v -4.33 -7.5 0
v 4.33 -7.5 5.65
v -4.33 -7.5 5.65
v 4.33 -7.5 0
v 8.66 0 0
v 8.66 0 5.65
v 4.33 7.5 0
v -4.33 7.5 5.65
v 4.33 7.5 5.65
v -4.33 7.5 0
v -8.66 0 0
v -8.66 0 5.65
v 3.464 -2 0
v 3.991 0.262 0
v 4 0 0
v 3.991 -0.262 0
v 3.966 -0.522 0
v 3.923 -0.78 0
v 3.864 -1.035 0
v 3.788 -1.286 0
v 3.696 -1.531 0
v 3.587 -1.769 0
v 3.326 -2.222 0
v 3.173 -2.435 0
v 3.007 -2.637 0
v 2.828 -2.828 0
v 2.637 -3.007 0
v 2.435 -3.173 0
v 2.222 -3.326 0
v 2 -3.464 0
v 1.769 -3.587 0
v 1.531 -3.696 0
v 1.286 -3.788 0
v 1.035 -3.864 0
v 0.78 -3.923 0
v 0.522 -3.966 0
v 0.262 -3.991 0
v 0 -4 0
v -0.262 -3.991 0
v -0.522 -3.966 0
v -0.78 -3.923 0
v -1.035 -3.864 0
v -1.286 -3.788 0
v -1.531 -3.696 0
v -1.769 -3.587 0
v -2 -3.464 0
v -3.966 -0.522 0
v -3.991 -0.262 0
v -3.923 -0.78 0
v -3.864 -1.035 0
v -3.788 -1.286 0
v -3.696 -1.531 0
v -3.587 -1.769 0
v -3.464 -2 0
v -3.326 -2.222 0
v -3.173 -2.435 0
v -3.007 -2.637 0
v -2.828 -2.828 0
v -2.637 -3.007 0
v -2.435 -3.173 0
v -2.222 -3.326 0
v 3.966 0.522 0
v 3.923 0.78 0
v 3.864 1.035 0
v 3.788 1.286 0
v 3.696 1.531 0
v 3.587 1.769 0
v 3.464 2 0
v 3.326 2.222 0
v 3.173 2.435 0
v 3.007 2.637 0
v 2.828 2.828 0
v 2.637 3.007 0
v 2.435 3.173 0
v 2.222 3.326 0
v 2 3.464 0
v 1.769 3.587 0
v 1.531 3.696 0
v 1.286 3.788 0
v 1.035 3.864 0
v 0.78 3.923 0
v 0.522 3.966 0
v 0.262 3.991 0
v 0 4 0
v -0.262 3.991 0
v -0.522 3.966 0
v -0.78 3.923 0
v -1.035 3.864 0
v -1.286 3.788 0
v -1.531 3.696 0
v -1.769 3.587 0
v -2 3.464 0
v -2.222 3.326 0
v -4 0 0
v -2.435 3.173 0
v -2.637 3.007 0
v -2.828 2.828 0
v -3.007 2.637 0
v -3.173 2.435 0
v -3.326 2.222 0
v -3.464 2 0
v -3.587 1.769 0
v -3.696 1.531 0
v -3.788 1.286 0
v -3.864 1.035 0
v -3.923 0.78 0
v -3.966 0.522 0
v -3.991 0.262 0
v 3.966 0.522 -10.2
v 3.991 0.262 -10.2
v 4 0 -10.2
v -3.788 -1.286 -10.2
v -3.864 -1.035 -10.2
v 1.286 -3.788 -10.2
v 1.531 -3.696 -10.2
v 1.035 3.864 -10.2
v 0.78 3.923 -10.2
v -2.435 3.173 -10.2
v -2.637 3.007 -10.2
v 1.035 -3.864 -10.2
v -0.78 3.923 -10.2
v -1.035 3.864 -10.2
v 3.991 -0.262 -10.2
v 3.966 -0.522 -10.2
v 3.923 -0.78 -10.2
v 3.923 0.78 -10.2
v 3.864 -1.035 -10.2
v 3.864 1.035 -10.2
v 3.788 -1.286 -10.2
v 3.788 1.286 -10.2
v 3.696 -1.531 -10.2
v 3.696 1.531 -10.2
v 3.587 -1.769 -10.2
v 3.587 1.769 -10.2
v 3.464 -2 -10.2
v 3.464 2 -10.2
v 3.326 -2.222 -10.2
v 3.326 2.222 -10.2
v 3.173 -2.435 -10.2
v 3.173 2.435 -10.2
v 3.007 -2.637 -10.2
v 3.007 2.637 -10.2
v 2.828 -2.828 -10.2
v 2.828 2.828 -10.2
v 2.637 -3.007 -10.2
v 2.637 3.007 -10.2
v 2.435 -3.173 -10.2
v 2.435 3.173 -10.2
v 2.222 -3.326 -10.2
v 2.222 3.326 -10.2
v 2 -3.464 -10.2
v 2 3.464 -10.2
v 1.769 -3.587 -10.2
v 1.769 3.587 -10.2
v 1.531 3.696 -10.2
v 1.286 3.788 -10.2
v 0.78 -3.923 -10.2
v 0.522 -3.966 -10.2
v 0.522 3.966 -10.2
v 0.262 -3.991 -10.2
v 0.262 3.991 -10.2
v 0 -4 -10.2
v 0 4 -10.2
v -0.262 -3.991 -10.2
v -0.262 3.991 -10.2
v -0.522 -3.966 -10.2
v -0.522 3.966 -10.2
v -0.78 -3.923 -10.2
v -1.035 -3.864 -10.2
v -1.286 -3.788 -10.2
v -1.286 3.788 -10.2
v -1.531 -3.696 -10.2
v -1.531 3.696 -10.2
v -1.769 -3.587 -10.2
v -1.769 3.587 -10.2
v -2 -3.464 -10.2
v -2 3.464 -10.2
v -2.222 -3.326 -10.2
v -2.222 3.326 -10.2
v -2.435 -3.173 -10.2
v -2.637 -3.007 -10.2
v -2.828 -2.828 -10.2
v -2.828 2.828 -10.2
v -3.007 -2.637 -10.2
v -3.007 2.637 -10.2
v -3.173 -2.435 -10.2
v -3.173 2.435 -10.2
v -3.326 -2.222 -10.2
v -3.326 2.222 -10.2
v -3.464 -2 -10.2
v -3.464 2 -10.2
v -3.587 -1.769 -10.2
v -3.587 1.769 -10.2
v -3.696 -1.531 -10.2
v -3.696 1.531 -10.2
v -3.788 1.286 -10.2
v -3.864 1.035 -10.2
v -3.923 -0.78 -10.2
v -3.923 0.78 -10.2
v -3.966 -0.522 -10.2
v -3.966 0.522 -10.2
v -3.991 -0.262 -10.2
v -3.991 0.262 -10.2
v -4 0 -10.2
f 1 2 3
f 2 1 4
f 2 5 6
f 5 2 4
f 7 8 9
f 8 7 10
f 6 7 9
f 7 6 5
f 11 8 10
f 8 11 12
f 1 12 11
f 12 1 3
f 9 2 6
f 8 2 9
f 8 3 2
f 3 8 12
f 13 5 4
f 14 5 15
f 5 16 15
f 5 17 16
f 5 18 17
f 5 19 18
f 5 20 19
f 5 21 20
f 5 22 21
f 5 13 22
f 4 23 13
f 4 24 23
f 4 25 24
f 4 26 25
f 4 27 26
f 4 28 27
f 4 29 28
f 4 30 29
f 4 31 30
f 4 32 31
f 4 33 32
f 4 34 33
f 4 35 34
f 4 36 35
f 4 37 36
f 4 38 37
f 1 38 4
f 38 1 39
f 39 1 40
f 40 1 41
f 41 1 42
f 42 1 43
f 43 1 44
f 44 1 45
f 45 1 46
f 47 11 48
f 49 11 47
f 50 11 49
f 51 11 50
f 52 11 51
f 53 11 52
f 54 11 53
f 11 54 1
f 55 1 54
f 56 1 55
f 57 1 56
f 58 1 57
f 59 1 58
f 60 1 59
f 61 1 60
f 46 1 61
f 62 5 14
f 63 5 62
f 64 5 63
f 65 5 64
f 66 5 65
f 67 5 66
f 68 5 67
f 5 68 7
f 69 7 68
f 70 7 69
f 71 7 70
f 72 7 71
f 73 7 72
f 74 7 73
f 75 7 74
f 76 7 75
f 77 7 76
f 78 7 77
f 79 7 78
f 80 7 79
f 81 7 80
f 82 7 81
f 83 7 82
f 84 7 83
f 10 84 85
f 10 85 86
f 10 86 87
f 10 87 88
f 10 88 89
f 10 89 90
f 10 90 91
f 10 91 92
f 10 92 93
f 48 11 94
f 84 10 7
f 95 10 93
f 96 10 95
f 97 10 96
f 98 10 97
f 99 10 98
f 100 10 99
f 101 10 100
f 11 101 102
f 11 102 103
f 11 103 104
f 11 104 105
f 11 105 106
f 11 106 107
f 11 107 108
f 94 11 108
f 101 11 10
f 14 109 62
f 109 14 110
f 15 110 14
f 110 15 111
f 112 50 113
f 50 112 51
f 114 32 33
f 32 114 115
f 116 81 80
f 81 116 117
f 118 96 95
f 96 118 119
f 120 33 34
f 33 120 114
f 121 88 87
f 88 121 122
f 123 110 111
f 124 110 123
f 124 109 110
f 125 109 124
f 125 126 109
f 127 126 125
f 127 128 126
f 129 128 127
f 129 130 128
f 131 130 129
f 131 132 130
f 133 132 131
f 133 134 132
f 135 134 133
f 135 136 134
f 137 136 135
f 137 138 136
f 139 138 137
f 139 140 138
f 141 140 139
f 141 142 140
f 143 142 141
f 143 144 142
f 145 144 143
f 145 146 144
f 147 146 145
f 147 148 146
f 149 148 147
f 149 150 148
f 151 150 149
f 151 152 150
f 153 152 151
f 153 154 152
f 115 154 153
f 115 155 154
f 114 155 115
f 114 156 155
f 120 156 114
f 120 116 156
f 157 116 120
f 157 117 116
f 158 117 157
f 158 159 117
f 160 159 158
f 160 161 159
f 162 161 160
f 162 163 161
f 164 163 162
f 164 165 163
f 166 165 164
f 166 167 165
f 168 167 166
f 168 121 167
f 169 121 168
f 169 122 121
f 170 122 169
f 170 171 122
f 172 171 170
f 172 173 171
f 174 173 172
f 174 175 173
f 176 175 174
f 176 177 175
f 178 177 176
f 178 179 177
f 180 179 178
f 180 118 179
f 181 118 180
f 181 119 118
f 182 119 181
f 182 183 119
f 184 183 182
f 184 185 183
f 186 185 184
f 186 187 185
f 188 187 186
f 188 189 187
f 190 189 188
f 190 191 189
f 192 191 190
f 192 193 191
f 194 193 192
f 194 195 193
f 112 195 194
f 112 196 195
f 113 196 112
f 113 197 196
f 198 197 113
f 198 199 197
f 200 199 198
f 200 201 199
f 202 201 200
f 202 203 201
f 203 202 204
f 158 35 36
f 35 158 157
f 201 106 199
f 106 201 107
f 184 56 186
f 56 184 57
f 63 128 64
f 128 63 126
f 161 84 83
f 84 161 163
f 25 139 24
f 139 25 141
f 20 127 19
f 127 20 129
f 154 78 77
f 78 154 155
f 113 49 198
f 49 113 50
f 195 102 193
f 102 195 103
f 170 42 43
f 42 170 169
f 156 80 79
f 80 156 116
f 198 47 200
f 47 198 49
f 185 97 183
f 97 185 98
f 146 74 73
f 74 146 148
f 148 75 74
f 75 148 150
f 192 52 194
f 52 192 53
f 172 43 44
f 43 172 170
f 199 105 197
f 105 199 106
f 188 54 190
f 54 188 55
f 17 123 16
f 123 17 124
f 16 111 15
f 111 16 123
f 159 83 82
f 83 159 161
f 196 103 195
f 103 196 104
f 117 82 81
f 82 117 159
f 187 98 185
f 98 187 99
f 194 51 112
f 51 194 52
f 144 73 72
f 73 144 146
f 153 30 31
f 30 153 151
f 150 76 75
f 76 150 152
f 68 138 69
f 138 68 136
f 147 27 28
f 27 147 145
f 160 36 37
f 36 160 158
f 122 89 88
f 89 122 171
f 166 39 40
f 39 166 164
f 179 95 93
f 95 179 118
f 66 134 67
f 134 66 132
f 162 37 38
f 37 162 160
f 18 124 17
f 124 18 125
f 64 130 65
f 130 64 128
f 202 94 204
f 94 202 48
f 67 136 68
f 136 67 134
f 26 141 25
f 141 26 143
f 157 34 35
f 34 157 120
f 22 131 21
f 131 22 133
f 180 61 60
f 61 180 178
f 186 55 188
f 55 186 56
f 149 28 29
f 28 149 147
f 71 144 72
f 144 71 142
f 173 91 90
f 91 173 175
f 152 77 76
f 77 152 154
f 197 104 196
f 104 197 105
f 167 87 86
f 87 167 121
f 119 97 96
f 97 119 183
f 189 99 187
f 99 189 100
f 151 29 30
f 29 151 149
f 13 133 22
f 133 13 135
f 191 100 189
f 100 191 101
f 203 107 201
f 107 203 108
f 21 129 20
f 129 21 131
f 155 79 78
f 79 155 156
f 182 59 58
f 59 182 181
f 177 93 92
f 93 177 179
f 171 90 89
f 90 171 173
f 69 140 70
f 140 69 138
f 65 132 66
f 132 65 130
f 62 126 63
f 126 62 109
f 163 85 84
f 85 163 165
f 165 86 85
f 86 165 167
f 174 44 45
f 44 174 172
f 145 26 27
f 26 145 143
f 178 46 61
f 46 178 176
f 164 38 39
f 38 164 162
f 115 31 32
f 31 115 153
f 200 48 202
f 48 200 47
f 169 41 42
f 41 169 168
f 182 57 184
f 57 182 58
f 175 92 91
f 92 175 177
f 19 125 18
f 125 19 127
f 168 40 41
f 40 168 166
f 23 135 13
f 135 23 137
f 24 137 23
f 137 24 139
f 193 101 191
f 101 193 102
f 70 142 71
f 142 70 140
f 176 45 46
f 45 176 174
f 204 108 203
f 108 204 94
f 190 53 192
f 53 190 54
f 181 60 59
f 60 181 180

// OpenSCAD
// Hex head screw (single connected solid)
// Specs: 8.0mm shank diameter, 15.0mm head diameter (across flats), head height 5.65mm, 10.0mm length under head

shaft_diameter_mm      = 8.0;
head_across_flats_mm   = 15.0;
head_height_mm         = 5.65;
length_under_head_mm   = 10.0;

// Small overlap to guarantee watertight union
overlap_mm = 0.2;

// Derived: hex circumradius from across-flats (AF = 2*R*cos(30) => R = AF / sqrt(3))
hex_circumradius_mm = head_across_flats_mm / sqrt(3);

module hex_head_screw() {
    union() {
        // Head: sits on top of the under-head plane at z=0
        translate([0, 0, head_height_mm/2])
            cylinder(r=hex_circumradius_mm, h=head_height_mm, $fn=6, center=true);

        // Shank: starts at z=0 and extends downward length_under_head_mm
        translate([0, 0, -length_under_head_mm/2 - overlap_mm/2])
            cylinder(r=shaft_diameter_mm/2, h=length_under_head_mm + overlap_mm, $fn=96, center=true);
    }
}

hex_head_screw();
